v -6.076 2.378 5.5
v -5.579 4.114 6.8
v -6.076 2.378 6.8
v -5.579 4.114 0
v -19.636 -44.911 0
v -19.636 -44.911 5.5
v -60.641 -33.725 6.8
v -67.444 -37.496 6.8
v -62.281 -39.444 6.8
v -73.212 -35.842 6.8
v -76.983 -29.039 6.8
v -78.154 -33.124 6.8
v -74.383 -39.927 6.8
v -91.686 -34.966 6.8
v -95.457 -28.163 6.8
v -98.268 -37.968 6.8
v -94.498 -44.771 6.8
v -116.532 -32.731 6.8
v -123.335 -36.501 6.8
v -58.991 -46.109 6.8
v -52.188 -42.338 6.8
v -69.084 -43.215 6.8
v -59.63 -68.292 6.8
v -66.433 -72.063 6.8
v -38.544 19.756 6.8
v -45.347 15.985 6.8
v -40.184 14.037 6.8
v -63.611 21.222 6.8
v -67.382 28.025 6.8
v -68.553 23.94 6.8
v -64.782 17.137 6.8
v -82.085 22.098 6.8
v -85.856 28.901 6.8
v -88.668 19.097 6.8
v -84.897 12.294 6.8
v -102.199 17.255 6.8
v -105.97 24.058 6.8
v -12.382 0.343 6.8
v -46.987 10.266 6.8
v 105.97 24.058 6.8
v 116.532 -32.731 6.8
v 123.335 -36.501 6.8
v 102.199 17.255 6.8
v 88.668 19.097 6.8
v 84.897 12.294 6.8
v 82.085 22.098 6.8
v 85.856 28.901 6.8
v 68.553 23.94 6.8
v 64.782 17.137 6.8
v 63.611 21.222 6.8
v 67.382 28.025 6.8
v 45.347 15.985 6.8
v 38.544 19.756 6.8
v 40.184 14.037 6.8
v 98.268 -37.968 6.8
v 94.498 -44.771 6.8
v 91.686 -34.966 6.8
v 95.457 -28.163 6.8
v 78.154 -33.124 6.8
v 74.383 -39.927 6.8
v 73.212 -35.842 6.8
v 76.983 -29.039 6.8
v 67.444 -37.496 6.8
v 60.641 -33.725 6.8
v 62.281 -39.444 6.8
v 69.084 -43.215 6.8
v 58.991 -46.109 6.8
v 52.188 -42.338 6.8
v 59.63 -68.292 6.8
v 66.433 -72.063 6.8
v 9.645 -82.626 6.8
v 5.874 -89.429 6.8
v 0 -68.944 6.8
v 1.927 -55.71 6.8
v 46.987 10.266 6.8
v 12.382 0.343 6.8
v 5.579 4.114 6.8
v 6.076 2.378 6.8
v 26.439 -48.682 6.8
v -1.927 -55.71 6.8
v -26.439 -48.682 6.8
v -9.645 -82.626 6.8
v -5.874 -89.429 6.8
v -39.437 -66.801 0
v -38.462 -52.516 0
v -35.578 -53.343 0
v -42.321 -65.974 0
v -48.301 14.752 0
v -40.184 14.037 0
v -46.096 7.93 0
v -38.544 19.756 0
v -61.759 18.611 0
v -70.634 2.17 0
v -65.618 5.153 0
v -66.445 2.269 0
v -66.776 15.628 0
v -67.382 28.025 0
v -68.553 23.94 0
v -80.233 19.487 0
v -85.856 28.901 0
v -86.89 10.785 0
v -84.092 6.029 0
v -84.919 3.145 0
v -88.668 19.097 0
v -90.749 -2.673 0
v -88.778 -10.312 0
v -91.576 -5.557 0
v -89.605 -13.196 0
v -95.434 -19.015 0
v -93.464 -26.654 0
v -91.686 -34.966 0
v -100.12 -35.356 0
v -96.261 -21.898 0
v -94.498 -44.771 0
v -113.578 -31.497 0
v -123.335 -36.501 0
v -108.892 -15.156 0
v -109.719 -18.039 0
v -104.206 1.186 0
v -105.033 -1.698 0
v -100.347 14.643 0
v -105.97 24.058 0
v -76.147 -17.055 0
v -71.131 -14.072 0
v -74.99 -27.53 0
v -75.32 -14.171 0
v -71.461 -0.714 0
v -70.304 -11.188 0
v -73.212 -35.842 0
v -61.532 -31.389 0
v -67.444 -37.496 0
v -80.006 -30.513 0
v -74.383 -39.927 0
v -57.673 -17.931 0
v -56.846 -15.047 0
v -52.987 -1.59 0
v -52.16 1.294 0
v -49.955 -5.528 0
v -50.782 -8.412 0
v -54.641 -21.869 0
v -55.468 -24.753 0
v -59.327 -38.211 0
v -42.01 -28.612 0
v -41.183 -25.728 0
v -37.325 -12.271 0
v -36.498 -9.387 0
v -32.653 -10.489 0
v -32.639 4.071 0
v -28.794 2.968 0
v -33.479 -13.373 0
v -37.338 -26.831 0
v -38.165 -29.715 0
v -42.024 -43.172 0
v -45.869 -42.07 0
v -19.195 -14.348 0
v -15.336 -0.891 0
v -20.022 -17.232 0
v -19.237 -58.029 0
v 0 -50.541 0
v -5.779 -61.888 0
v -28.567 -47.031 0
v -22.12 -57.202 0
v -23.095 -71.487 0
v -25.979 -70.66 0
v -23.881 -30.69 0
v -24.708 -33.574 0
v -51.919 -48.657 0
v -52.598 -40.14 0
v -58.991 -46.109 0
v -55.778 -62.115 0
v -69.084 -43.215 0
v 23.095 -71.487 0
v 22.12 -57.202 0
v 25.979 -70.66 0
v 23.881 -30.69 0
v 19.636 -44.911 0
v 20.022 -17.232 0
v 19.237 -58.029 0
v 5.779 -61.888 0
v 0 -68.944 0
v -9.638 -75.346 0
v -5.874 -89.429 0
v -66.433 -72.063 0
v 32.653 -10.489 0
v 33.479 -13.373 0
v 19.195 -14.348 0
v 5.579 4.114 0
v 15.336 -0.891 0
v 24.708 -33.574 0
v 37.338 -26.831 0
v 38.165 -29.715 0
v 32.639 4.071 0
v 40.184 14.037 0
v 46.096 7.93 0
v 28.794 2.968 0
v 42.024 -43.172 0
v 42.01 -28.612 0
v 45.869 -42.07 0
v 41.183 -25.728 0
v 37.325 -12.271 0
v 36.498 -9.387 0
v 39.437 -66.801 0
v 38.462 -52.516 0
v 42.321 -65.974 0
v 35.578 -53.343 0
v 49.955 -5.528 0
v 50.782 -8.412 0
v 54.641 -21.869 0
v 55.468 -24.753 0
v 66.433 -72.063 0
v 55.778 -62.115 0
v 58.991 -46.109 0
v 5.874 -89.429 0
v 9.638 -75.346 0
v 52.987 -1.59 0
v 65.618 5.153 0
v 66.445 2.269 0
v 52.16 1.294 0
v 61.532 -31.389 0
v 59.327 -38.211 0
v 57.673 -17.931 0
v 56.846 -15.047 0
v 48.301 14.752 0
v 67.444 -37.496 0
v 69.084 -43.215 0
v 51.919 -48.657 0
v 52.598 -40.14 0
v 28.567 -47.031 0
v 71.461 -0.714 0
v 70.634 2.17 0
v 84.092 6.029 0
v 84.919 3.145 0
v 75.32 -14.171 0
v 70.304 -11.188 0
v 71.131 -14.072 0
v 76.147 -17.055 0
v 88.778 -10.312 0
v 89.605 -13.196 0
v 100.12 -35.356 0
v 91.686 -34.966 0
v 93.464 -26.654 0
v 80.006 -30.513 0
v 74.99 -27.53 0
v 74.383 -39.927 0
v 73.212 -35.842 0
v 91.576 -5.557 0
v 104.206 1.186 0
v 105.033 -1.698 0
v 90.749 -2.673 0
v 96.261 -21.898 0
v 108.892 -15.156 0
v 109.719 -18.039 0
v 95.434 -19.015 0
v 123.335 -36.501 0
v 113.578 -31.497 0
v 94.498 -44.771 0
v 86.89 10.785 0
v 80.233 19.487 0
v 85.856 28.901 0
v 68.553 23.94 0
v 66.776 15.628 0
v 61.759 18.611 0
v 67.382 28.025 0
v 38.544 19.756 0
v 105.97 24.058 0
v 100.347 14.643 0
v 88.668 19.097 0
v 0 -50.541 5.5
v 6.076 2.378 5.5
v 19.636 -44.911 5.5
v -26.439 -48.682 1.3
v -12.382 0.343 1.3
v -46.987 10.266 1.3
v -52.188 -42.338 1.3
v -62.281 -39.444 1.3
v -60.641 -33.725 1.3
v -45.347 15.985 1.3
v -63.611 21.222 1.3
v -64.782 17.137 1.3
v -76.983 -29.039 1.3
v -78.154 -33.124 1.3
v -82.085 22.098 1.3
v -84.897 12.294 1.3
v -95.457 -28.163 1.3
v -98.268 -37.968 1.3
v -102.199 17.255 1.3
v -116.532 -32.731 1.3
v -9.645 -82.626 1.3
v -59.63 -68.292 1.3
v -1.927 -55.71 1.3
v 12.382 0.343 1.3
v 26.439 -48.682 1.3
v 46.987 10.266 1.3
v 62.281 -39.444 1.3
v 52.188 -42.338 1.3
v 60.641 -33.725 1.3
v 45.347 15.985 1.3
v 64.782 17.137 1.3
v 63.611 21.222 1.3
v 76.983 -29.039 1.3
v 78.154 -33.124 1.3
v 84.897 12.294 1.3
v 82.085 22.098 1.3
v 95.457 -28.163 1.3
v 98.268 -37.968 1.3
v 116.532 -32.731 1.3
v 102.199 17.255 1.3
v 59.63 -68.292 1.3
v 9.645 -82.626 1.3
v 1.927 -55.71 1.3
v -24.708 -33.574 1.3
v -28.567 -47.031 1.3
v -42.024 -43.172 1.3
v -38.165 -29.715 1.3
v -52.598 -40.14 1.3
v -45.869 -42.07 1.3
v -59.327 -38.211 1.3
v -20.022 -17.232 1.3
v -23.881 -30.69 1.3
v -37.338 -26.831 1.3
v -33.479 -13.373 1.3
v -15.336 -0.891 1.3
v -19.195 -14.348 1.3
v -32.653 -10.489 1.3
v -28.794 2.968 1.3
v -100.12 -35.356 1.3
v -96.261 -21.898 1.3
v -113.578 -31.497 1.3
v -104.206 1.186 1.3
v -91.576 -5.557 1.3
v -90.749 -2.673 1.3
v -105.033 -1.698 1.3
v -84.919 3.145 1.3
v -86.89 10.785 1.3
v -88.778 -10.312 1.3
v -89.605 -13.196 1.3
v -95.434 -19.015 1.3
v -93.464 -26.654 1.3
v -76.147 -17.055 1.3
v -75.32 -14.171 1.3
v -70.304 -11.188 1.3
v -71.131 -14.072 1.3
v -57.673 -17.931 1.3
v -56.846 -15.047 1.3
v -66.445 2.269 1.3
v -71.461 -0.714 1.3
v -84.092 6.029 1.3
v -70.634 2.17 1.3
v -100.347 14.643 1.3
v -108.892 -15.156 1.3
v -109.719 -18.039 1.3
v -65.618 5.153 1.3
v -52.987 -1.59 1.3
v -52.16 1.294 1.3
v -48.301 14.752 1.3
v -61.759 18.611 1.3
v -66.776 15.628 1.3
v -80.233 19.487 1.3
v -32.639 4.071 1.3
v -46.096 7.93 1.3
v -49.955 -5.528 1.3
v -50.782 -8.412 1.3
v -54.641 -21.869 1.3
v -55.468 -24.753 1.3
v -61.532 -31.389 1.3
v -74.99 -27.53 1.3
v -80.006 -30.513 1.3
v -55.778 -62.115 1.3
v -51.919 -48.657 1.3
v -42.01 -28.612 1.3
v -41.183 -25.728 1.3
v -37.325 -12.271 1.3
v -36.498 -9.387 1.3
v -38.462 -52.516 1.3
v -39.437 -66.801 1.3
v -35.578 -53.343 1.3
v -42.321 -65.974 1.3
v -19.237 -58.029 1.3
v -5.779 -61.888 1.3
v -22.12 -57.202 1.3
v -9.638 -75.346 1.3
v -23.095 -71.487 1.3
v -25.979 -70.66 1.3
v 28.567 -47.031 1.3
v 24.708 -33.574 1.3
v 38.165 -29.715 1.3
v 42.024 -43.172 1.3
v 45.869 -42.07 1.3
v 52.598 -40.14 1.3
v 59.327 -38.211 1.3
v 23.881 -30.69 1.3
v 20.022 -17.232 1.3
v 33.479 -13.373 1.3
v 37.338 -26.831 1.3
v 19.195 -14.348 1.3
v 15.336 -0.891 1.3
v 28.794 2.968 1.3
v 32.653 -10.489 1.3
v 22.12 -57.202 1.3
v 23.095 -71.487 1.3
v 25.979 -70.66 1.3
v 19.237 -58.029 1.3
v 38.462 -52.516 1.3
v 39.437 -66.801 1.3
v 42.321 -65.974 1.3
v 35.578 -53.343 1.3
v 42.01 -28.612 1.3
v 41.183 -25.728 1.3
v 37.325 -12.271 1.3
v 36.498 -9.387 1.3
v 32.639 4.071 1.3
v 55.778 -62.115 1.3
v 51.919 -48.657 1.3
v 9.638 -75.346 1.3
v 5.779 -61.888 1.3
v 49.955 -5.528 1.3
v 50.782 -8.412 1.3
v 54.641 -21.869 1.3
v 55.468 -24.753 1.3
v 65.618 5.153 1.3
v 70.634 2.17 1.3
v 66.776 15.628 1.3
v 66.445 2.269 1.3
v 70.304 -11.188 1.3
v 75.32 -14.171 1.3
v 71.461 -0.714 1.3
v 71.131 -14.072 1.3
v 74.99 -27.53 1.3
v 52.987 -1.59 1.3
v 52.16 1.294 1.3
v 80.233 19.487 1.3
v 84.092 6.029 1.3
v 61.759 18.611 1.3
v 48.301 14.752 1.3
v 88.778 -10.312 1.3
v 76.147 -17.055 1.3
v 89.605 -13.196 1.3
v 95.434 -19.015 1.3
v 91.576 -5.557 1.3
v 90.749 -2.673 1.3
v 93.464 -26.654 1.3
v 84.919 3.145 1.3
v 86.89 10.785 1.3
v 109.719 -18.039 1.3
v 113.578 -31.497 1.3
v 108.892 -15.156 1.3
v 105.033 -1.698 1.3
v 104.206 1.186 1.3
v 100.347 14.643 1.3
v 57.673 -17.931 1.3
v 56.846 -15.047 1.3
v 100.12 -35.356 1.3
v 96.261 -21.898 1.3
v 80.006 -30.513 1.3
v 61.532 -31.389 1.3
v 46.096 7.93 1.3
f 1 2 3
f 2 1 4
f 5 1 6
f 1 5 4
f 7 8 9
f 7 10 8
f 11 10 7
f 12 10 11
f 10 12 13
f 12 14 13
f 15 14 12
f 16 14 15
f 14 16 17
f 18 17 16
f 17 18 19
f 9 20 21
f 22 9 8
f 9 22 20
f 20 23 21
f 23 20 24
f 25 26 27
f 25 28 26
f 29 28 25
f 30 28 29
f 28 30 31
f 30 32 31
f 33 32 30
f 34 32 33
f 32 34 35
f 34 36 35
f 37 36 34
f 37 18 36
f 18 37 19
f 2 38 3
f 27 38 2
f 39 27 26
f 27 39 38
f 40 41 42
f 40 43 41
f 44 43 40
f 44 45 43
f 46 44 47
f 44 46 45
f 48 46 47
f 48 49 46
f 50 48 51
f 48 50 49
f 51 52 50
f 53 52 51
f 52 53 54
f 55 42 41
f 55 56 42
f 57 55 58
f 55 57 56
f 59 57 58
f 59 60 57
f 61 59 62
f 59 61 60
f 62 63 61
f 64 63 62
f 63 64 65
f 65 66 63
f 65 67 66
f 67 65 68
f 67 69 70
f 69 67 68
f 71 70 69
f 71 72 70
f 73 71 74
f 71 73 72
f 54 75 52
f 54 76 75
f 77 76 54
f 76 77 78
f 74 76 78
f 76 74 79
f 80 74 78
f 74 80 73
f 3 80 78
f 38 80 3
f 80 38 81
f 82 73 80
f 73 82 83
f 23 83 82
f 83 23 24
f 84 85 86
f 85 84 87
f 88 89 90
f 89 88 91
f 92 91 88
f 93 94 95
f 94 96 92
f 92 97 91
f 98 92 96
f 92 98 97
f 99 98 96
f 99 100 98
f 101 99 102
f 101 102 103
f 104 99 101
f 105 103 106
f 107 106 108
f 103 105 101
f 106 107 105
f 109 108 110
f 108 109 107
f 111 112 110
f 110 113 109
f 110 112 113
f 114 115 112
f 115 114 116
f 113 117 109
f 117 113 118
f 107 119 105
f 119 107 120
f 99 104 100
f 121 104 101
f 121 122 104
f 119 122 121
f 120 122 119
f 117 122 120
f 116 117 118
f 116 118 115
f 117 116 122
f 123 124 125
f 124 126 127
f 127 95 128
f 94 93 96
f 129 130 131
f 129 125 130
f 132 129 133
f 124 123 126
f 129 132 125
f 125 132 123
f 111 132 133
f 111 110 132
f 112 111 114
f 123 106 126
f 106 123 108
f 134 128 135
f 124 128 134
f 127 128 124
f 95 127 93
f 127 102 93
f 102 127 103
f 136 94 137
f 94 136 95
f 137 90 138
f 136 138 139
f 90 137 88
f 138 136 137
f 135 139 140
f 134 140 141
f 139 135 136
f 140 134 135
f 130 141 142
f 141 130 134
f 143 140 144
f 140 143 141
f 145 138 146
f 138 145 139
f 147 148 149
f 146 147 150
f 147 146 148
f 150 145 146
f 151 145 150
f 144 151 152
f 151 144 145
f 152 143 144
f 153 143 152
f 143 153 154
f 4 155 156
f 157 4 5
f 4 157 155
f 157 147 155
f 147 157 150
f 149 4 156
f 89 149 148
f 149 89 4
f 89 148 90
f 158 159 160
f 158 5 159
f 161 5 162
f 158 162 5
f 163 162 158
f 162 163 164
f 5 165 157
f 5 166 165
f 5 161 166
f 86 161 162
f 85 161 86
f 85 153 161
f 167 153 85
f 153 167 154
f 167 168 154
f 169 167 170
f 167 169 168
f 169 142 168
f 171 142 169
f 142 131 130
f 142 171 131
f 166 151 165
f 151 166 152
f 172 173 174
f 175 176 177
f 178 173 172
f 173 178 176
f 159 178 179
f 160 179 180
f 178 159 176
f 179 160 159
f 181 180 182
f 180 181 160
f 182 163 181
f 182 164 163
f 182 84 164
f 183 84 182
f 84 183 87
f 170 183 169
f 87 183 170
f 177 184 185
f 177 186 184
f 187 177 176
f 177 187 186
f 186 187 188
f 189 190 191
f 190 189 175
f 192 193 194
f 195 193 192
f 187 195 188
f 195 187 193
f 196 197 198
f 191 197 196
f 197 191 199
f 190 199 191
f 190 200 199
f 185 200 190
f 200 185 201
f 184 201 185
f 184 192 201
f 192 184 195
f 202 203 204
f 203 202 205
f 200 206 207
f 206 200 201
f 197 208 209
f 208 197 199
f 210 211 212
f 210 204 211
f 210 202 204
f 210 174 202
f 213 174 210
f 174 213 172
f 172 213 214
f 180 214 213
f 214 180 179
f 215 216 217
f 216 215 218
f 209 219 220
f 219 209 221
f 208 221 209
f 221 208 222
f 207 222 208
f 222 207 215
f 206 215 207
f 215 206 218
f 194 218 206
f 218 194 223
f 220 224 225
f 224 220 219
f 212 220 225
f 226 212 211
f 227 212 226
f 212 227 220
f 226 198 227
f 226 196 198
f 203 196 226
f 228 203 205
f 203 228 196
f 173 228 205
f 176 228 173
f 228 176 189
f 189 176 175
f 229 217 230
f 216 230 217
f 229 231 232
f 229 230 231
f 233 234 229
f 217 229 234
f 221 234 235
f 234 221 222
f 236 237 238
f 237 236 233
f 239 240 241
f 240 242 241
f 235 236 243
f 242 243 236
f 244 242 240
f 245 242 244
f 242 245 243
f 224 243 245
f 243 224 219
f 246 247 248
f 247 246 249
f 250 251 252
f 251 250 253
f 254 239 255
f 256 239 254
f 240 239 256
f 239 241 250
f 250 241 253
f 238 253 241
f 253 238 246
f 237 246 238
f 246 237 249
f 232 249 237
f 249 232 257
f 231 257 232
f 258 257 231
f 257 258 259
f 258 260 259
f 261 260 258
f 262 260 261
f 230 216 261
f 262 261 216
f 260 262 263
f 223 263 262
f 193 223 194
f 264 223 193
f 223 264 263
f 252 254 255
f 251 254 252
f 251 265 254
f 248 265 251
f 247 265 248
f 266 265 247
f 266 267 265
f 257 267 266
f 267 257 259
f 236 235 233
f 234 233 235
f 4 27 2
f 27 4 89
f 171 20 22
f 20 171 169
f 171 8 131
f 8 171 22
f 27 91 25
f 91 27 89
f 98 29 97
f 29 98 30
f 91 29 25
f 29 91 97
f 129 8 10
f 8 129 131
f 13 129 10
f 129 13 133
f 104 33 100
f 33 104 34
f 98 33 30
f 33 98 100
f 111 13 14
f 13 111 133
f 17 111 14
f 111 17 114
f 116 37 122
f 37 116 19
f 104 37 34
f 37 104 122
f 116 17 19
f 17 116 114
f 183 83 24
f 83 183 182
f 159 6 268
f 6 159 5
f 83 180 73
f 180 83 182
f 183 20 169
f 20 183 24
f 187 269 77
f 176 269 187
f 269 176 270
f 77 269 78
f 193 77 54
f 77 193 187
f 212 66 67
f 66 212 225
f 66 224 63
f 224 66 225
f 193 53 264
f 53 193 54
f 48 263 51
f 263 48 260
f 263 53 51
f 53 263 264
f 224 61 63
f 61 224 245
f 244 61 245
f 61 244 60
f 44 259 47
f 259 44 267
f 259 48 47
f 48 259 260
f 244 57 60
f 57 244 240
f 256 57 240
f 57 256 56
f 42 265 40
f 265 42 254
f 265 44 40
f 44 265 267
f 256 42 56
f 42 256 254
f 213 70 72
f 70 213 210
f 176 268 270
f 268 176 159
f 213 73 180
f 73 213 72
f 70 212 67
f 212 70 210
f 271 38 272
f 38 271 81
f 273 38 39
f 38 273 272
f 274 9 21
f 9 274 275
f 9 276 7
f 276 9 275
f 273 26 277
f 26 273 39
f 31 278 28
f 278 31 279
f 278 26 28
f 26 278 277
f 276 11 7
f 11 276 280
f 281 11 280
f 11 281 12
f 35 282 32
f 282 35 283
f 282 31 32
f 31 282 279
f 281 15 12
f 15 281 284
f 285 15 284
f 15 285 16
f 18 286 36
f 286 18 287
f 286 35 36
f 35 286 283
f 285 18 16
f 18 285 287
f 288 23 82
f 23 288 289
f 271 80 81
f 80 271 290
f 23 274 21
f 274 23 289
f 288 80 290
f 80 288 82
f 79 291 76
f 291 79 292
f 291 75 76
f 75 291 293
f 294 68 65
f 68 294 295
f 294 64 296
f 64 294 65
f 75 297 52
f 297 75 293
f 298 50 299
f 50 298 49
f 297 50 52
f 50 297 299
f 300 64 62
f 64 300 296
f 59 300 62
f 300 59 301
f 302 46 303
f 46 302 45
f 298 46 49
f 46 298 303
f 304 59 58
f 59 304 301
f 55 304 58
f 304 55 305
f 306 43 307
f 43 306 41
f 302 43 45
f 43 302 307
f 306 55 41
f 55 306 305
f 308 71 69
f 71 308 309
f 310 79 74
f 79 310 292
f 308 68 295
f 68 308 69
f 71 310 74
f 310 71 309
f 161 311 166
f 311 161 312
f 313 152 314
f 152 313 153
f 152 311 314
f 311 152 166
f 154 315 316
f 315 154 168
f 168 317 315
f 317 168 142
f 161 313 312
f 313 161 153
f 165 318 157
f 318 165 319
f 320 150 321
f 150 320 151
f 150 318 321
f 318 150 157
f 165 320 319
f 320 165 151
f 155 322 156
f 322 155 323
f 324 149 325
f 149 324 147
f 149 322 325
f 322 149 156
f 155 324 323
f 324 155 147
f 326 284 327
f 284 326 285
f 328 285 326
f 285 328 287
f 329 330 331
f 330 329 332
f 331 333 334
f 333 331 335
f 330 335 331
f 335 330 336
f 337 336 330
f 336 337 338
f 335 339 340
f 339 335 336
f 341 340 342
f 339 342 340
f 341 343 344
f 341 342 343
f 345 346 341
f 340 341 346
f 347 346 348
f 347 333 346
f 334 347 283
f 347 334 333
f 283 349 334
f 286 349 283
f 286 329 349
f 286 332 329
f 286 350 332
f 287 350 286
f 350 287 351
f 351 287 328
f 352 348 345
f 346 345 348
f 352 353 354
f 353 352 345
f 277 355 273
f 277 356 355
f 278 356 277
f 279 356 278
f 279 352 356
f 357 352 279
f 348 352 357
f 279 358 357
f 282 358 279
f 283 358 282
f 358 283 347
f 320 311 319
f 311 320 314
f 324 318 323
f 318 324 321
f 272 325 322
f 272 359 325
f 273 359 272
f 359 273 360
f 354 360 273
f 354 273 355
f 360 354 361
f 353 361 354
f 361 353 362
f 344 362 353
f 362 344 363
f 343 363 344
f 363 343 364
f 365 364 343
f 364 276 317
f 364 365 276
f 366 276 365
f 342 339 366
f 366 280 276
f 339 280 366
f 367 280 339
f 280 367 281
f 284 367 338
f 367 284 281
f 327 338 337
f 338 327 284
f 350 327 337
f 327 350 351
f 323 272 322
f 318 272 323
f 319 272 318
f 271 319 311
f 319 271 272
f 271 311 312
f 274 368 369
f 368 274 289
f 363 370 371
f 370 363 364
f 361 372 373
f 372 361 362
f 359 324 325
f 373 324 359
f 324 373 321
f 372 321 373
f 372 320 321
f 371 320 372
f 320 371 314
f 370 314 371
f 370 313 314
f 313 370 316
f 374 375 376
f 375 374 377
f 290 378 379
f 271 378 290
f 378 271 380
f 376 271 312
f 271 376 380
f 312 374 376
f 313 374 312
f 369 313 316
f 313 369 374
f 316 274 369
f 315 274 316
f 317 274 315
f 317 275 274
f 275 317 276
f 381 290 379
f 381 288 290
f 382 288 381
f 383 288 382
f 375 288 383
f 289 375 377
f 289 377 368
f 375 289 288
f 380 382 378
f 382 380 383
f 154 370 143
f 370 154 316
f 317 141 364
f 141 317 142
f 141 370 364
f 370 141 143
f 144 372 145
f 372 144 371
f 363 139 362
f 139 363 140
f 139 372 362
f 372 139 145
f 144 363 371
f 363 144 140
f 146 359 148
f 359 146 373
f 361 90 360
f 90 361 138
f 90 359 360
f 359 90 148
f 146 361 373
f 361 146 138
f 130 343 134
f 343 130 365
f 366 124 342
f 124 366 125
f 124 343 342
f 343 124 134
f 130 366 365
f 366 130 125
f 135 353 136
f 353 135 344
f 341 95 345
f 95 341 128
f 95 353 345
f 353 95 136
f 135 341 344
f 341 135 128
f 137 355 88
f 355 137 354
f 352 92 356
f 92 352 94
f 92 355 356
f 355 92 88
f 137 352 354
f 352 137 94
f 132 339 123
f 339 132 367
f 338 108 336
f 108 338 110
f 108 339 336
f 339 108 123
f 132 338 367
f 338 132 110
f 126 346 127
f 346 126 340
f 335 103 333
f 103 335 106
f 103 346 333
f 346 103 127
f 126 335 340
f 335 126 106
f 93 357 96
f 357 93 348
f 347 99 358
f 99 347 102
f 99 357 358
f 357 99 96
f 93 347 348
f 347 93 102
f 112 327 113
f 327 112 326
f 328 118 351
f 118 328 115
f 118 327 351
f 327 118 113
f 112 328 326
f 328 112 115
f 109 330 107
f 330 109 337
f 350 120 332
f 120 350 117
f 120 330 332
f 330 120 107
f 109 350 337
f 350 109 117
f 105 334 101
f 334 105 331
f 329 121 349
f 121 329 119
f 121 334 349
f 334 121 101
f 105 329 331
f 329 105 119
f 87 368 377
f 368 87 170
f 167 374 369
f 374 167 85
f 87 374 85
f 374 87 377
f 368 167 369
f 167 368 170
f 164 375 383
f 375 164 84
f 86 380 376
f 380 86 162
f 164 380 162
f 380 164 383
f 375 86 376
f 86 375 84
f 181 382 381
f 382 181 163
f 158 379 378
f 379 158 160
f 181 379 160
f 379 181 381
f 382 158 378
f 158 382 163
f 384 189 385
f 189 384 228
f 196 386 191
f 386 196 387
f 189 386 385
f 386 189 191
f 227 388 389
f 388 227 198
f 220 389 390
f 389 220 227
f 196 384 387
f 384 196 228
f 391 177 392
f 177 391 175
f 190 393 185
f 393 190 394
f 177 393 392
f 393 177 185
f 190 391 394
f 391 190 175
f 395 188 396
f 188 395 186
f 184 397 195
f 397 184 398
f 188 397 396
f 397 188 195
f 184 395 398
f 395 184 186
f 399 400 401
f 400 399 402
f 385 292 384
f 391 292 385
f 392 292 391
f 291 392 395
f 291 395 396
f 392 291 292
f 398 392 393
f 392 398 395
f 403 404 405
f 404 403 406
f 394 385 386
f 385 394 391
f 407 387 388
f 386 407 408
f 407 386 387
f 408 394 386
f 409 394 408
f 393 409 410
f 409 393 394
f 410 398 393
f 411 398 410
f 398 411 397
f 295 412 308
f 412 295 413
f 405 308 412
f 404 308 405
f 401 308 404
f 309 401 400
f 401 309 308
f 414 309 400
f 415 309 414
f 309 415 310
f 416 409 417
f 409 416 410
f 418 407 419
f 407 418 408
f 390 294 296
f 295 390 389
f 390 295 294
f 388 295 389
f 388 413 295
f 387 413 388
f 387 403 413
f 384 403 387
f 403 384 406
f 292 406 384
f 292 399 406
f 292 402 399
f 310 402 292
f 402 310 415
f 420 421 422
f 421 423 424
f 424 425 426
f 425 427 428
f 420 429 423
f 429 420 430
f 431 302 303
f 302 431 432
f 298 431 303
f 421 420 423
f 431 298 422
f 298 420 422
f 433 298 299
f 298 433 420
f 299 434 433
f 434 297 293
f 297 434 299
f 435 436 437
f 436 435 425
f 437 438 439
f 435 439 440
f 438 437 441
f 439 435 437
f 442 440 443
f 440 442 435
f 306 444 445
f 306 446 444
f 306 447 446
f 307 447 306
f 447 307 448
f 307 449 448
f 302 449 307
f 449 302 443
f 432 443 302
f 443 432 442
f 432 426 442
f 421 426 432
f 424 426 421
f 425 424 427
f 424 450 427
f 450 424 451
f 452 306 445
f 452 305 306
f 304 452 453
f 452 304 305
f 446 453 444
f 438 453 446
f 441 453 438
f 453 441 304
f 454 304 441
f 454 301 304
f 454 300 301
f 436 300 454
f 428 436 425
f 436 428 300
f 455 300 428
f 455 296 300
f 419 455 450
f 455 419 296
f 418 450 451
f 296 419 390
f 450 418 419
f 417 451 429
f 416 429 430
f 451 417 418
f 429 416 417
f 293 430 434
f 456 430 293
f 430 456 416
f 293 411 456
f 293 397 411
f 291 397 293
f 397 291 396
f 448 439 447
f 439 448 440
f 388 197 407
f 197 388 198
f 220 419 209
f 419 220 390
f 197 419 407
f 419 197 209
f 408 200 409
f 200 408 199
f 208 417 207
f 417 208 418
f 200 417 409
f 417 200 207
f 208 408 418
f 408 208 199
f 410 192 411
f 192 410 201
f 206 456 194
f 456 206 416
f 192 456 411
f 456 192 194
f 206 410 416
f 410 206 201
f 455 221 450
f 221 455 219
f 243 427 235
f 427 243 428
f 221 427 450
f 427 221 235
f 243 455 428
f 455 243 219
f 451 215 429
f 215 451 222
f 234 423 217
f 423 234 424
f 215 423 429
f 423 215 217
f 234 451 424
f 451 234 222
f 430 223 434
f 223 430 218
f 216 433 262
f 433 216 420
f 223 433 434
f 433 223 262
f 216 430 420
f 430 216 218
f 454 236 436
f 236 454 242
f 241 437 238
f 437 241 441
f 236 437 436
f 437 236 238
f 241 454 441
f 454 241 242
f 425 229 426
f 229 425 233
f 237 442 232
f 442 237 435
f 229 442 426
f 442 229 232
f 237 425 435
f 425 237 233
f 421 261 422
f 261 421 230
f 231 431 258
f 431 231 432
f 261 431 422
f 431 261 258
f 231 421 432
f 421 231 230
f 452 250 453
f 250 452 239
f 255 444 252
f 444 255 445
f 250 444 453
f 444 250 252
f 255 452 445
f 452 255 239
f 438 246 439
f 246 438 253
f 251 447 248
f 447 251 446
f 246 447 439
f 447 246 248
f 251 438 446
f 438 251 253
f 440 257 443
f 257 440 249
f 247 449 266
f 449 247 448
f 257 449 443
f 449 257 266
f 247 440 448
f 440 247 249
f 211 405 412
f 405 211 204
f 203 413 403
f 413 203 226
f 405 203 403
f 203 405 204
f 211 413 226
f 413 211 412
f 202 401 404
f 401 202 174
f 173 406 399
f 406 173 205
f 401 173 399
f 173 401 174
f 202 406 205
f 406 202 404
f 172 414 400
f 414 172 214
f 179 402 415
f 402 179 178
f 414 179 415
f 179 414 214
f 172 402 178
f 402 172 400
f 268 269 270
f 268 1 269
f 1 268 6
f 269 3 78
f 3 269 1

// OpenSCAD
use <../common.scad>;
//$fs = 0.5;


use <../common.scad>;


use_minkowski = false;
basic_minkowski = false;


edge_radius = 2.5;
surround_height = 5.5;

spacing = [18, 17];
plate_hole = 14;
plate_height = 1.3;

row_count = 3;
key_margin = 0.5;

thumb_keys = 3;
thumb_width = 1.5;
thumb_offset = 1.5;

column_offsets = [0, 0, 0.35, -0.25, -0.6];

angle = 16;
side_spacing = 26;


offset_sums = [for (i = [0 : len(column_offsets) - 1])
    sum([for (j = [0: i]) column_offsets[j]])
];
offset_sum = offset_sums[len(offset_sums) - 1];
//edge_padding = key_margin * 2 + (edge_radius * (surround ? 2 : 1));
//x_min = rotate_point([
//    -spacing[0] * len(column_offsets),
//    (row_count * -spacing[1]) - (offset_sum * -spacing[1])
//], -angle)[0] - (side_spacing * 0.5) - edge_padding;
//x_max = -x_min;
//y_min = min([for (i = [0 : len(offset_sums) - 1])
//    rotate_point([
//        i * -spacing[0],
//        (row_count * -spacing[1]) + (offset_sums[i] * -spacing[1])
//    ], -angle)[1]
//]) - edge_padding;
//y_max = max([for (i = [0 : len(offset_sums) - 1])
//    rotate_point([
//        (i + 1) * -spacing[0],
//        offset_sums[i] * spacing[1]
//    ], -angle)[1]
//]) + edge_padding;

echo("offset sums", offset_sums);
echo("offset sum", offset_sum);
//echo("x-min, x-max", x_min, x_max);
//echo("y-min, y-max", y_min, y_max);


function rotate_point(point, angle) = [
    (cos(angle) * point[0]) + (cos(90 - angle) * -point[1]),
    (sin(90 - angle) * point[1]) + (sin(angle) * point[0])
];


module column(
    rows = row_count,
    spacing = spacing,
    margin = key_margin,
    height = plate_height,
    mounting = true
) {
    translate([
        -(spacing[0] + margin),
        -((spacing[1] * rows) + margin),
        0
    ]) difference() {
        cube([spacing[0] + (margin * 2), (spacing[1] * rows) + (margin * 2), height]);
        if (mounting) {
            for (index = [0 : rows - 1]) {
                translate([
                    spacing[0] * 0.5 + margin,
                    (index + 0.5) * spacing[1] + margin,
                    0
                ]) {
                    if($children > 0) {
                        children();
                    } else {
                        translate([0, 0, height / 2])
                            cube(
                                [plate_hole, plate_hole, height + 0.2],
                                center = true
                            );
                    }
                }
            }
        }
    }
}


module columns(hull_pairs = false) {
    for (index = [0 : len(column_offsets) - 1]) {
        x_offset = -index * spacing[0];
        y_offset = offset_sums[index] * spacing[1];
        translate([x_offset, y_offset, 0])
        if (index == 0 || !hull_pairs) {
            children();
        } else {
            hull() {
                translate([spacing[0], -column_offsets[index] * spacing[1], 0])
                    children();
                children();
            }
        }
    }
}


module half_hand(
    hull_pairs = false,
    margin = key_margin,
    height = plate_height,
    mounting = true
) {
    columns(hull_pairs) column(margin = margin, height = height, mounting = mounting);
    translate([
        spacing[1] * thumb_offset,
        (-spacing[1] * (row_count)) - (spacing[0] * thumb_width),
        0
    ])
        rotate([0, 0, -90])
            column(
                rows = thumb_keys,
                spacing = [spacing[0] * thumb_width, spacing[1]],
                margin = margin,
                height = height,
                mounting = mounting
            );
}


module hand(
    hull_pairs = false,
    margin = key_margin,
    height = plate_height,
    mounting = true
) {
    translate([side_spacing * -0.5, 0, 0])
        rotate([0, 0, -angle])
        half_hand(
            hull_pairs = hull_pairs,
            margin = margin,
            height = height,
            mounting = mounting
        );
    scale([-1, 1, 1])
        translate([side_spacing * -0.5, 0, 0])
        rotate([0, 0, -angle])
        half_hand(
            hull_pairs = hull_pairs,
            margin = margin,
            height = height,
            mounting = mounting
        );
}


union() {
    poly_side = side_spacing * 0.5 - edge_radius;
    poly_bottom = row_count * -spacing[1] - key_margin;
    difference() {
        if (use_minkowski) {
            minkowski() {
                difference() {
                    hand(
                        margin = key_margin * 3 + edge_radius,
                        mounting = false
                    );
                    hand(
                        margin = key_margin + edge_radius,
                        mounting = false
                    );
                }
                if (basic_minkowski) {
                    translate([-edge_radius, -edge_radius, 0])
                        cube([edge_radius * 2, edge_radius * 2, surround_height]);
                } else {
                    union() {
                        cylinder(
                            h = surround_height - edge_radius,
                            r = edge_radius
                        );
                        translate([0, 0, surround_height - edge_radius])
                            sphere(r = edge_radius);
                    }
                }
            }
        } else {
            difference() {
                hand(
                    margin = key_margin * 2 + edge_radius * 2,
                    height = plate_height + surround_height,
                    mounting = false
                );
                translate([0, 0, -0.1])
                    hand(
                        margin = key_margin,
                        height = plate_height + surround_height + 0.2,
                        mounting = false
                    );
            }
        }    }
    hand(margin = key_margin * 3);
    translate([0, 0, surround_height])
        linear_extrude(plate_height)
            polygon([
                rotate_point([-poly_side + key_margin * 2, key_margin * -0.5], -angle),
                rotate_point([poly_side - key_margin * 2, key_margin * -0.5], angle),
                rotate_point([poly_side - key_margin, poly_bottom], angle),
                [0, poly_bottom - key_margin * 4],
                rotate_point([-poly_side + key_margin, poly_bottom], -angle)
            ]);
}
/**/
